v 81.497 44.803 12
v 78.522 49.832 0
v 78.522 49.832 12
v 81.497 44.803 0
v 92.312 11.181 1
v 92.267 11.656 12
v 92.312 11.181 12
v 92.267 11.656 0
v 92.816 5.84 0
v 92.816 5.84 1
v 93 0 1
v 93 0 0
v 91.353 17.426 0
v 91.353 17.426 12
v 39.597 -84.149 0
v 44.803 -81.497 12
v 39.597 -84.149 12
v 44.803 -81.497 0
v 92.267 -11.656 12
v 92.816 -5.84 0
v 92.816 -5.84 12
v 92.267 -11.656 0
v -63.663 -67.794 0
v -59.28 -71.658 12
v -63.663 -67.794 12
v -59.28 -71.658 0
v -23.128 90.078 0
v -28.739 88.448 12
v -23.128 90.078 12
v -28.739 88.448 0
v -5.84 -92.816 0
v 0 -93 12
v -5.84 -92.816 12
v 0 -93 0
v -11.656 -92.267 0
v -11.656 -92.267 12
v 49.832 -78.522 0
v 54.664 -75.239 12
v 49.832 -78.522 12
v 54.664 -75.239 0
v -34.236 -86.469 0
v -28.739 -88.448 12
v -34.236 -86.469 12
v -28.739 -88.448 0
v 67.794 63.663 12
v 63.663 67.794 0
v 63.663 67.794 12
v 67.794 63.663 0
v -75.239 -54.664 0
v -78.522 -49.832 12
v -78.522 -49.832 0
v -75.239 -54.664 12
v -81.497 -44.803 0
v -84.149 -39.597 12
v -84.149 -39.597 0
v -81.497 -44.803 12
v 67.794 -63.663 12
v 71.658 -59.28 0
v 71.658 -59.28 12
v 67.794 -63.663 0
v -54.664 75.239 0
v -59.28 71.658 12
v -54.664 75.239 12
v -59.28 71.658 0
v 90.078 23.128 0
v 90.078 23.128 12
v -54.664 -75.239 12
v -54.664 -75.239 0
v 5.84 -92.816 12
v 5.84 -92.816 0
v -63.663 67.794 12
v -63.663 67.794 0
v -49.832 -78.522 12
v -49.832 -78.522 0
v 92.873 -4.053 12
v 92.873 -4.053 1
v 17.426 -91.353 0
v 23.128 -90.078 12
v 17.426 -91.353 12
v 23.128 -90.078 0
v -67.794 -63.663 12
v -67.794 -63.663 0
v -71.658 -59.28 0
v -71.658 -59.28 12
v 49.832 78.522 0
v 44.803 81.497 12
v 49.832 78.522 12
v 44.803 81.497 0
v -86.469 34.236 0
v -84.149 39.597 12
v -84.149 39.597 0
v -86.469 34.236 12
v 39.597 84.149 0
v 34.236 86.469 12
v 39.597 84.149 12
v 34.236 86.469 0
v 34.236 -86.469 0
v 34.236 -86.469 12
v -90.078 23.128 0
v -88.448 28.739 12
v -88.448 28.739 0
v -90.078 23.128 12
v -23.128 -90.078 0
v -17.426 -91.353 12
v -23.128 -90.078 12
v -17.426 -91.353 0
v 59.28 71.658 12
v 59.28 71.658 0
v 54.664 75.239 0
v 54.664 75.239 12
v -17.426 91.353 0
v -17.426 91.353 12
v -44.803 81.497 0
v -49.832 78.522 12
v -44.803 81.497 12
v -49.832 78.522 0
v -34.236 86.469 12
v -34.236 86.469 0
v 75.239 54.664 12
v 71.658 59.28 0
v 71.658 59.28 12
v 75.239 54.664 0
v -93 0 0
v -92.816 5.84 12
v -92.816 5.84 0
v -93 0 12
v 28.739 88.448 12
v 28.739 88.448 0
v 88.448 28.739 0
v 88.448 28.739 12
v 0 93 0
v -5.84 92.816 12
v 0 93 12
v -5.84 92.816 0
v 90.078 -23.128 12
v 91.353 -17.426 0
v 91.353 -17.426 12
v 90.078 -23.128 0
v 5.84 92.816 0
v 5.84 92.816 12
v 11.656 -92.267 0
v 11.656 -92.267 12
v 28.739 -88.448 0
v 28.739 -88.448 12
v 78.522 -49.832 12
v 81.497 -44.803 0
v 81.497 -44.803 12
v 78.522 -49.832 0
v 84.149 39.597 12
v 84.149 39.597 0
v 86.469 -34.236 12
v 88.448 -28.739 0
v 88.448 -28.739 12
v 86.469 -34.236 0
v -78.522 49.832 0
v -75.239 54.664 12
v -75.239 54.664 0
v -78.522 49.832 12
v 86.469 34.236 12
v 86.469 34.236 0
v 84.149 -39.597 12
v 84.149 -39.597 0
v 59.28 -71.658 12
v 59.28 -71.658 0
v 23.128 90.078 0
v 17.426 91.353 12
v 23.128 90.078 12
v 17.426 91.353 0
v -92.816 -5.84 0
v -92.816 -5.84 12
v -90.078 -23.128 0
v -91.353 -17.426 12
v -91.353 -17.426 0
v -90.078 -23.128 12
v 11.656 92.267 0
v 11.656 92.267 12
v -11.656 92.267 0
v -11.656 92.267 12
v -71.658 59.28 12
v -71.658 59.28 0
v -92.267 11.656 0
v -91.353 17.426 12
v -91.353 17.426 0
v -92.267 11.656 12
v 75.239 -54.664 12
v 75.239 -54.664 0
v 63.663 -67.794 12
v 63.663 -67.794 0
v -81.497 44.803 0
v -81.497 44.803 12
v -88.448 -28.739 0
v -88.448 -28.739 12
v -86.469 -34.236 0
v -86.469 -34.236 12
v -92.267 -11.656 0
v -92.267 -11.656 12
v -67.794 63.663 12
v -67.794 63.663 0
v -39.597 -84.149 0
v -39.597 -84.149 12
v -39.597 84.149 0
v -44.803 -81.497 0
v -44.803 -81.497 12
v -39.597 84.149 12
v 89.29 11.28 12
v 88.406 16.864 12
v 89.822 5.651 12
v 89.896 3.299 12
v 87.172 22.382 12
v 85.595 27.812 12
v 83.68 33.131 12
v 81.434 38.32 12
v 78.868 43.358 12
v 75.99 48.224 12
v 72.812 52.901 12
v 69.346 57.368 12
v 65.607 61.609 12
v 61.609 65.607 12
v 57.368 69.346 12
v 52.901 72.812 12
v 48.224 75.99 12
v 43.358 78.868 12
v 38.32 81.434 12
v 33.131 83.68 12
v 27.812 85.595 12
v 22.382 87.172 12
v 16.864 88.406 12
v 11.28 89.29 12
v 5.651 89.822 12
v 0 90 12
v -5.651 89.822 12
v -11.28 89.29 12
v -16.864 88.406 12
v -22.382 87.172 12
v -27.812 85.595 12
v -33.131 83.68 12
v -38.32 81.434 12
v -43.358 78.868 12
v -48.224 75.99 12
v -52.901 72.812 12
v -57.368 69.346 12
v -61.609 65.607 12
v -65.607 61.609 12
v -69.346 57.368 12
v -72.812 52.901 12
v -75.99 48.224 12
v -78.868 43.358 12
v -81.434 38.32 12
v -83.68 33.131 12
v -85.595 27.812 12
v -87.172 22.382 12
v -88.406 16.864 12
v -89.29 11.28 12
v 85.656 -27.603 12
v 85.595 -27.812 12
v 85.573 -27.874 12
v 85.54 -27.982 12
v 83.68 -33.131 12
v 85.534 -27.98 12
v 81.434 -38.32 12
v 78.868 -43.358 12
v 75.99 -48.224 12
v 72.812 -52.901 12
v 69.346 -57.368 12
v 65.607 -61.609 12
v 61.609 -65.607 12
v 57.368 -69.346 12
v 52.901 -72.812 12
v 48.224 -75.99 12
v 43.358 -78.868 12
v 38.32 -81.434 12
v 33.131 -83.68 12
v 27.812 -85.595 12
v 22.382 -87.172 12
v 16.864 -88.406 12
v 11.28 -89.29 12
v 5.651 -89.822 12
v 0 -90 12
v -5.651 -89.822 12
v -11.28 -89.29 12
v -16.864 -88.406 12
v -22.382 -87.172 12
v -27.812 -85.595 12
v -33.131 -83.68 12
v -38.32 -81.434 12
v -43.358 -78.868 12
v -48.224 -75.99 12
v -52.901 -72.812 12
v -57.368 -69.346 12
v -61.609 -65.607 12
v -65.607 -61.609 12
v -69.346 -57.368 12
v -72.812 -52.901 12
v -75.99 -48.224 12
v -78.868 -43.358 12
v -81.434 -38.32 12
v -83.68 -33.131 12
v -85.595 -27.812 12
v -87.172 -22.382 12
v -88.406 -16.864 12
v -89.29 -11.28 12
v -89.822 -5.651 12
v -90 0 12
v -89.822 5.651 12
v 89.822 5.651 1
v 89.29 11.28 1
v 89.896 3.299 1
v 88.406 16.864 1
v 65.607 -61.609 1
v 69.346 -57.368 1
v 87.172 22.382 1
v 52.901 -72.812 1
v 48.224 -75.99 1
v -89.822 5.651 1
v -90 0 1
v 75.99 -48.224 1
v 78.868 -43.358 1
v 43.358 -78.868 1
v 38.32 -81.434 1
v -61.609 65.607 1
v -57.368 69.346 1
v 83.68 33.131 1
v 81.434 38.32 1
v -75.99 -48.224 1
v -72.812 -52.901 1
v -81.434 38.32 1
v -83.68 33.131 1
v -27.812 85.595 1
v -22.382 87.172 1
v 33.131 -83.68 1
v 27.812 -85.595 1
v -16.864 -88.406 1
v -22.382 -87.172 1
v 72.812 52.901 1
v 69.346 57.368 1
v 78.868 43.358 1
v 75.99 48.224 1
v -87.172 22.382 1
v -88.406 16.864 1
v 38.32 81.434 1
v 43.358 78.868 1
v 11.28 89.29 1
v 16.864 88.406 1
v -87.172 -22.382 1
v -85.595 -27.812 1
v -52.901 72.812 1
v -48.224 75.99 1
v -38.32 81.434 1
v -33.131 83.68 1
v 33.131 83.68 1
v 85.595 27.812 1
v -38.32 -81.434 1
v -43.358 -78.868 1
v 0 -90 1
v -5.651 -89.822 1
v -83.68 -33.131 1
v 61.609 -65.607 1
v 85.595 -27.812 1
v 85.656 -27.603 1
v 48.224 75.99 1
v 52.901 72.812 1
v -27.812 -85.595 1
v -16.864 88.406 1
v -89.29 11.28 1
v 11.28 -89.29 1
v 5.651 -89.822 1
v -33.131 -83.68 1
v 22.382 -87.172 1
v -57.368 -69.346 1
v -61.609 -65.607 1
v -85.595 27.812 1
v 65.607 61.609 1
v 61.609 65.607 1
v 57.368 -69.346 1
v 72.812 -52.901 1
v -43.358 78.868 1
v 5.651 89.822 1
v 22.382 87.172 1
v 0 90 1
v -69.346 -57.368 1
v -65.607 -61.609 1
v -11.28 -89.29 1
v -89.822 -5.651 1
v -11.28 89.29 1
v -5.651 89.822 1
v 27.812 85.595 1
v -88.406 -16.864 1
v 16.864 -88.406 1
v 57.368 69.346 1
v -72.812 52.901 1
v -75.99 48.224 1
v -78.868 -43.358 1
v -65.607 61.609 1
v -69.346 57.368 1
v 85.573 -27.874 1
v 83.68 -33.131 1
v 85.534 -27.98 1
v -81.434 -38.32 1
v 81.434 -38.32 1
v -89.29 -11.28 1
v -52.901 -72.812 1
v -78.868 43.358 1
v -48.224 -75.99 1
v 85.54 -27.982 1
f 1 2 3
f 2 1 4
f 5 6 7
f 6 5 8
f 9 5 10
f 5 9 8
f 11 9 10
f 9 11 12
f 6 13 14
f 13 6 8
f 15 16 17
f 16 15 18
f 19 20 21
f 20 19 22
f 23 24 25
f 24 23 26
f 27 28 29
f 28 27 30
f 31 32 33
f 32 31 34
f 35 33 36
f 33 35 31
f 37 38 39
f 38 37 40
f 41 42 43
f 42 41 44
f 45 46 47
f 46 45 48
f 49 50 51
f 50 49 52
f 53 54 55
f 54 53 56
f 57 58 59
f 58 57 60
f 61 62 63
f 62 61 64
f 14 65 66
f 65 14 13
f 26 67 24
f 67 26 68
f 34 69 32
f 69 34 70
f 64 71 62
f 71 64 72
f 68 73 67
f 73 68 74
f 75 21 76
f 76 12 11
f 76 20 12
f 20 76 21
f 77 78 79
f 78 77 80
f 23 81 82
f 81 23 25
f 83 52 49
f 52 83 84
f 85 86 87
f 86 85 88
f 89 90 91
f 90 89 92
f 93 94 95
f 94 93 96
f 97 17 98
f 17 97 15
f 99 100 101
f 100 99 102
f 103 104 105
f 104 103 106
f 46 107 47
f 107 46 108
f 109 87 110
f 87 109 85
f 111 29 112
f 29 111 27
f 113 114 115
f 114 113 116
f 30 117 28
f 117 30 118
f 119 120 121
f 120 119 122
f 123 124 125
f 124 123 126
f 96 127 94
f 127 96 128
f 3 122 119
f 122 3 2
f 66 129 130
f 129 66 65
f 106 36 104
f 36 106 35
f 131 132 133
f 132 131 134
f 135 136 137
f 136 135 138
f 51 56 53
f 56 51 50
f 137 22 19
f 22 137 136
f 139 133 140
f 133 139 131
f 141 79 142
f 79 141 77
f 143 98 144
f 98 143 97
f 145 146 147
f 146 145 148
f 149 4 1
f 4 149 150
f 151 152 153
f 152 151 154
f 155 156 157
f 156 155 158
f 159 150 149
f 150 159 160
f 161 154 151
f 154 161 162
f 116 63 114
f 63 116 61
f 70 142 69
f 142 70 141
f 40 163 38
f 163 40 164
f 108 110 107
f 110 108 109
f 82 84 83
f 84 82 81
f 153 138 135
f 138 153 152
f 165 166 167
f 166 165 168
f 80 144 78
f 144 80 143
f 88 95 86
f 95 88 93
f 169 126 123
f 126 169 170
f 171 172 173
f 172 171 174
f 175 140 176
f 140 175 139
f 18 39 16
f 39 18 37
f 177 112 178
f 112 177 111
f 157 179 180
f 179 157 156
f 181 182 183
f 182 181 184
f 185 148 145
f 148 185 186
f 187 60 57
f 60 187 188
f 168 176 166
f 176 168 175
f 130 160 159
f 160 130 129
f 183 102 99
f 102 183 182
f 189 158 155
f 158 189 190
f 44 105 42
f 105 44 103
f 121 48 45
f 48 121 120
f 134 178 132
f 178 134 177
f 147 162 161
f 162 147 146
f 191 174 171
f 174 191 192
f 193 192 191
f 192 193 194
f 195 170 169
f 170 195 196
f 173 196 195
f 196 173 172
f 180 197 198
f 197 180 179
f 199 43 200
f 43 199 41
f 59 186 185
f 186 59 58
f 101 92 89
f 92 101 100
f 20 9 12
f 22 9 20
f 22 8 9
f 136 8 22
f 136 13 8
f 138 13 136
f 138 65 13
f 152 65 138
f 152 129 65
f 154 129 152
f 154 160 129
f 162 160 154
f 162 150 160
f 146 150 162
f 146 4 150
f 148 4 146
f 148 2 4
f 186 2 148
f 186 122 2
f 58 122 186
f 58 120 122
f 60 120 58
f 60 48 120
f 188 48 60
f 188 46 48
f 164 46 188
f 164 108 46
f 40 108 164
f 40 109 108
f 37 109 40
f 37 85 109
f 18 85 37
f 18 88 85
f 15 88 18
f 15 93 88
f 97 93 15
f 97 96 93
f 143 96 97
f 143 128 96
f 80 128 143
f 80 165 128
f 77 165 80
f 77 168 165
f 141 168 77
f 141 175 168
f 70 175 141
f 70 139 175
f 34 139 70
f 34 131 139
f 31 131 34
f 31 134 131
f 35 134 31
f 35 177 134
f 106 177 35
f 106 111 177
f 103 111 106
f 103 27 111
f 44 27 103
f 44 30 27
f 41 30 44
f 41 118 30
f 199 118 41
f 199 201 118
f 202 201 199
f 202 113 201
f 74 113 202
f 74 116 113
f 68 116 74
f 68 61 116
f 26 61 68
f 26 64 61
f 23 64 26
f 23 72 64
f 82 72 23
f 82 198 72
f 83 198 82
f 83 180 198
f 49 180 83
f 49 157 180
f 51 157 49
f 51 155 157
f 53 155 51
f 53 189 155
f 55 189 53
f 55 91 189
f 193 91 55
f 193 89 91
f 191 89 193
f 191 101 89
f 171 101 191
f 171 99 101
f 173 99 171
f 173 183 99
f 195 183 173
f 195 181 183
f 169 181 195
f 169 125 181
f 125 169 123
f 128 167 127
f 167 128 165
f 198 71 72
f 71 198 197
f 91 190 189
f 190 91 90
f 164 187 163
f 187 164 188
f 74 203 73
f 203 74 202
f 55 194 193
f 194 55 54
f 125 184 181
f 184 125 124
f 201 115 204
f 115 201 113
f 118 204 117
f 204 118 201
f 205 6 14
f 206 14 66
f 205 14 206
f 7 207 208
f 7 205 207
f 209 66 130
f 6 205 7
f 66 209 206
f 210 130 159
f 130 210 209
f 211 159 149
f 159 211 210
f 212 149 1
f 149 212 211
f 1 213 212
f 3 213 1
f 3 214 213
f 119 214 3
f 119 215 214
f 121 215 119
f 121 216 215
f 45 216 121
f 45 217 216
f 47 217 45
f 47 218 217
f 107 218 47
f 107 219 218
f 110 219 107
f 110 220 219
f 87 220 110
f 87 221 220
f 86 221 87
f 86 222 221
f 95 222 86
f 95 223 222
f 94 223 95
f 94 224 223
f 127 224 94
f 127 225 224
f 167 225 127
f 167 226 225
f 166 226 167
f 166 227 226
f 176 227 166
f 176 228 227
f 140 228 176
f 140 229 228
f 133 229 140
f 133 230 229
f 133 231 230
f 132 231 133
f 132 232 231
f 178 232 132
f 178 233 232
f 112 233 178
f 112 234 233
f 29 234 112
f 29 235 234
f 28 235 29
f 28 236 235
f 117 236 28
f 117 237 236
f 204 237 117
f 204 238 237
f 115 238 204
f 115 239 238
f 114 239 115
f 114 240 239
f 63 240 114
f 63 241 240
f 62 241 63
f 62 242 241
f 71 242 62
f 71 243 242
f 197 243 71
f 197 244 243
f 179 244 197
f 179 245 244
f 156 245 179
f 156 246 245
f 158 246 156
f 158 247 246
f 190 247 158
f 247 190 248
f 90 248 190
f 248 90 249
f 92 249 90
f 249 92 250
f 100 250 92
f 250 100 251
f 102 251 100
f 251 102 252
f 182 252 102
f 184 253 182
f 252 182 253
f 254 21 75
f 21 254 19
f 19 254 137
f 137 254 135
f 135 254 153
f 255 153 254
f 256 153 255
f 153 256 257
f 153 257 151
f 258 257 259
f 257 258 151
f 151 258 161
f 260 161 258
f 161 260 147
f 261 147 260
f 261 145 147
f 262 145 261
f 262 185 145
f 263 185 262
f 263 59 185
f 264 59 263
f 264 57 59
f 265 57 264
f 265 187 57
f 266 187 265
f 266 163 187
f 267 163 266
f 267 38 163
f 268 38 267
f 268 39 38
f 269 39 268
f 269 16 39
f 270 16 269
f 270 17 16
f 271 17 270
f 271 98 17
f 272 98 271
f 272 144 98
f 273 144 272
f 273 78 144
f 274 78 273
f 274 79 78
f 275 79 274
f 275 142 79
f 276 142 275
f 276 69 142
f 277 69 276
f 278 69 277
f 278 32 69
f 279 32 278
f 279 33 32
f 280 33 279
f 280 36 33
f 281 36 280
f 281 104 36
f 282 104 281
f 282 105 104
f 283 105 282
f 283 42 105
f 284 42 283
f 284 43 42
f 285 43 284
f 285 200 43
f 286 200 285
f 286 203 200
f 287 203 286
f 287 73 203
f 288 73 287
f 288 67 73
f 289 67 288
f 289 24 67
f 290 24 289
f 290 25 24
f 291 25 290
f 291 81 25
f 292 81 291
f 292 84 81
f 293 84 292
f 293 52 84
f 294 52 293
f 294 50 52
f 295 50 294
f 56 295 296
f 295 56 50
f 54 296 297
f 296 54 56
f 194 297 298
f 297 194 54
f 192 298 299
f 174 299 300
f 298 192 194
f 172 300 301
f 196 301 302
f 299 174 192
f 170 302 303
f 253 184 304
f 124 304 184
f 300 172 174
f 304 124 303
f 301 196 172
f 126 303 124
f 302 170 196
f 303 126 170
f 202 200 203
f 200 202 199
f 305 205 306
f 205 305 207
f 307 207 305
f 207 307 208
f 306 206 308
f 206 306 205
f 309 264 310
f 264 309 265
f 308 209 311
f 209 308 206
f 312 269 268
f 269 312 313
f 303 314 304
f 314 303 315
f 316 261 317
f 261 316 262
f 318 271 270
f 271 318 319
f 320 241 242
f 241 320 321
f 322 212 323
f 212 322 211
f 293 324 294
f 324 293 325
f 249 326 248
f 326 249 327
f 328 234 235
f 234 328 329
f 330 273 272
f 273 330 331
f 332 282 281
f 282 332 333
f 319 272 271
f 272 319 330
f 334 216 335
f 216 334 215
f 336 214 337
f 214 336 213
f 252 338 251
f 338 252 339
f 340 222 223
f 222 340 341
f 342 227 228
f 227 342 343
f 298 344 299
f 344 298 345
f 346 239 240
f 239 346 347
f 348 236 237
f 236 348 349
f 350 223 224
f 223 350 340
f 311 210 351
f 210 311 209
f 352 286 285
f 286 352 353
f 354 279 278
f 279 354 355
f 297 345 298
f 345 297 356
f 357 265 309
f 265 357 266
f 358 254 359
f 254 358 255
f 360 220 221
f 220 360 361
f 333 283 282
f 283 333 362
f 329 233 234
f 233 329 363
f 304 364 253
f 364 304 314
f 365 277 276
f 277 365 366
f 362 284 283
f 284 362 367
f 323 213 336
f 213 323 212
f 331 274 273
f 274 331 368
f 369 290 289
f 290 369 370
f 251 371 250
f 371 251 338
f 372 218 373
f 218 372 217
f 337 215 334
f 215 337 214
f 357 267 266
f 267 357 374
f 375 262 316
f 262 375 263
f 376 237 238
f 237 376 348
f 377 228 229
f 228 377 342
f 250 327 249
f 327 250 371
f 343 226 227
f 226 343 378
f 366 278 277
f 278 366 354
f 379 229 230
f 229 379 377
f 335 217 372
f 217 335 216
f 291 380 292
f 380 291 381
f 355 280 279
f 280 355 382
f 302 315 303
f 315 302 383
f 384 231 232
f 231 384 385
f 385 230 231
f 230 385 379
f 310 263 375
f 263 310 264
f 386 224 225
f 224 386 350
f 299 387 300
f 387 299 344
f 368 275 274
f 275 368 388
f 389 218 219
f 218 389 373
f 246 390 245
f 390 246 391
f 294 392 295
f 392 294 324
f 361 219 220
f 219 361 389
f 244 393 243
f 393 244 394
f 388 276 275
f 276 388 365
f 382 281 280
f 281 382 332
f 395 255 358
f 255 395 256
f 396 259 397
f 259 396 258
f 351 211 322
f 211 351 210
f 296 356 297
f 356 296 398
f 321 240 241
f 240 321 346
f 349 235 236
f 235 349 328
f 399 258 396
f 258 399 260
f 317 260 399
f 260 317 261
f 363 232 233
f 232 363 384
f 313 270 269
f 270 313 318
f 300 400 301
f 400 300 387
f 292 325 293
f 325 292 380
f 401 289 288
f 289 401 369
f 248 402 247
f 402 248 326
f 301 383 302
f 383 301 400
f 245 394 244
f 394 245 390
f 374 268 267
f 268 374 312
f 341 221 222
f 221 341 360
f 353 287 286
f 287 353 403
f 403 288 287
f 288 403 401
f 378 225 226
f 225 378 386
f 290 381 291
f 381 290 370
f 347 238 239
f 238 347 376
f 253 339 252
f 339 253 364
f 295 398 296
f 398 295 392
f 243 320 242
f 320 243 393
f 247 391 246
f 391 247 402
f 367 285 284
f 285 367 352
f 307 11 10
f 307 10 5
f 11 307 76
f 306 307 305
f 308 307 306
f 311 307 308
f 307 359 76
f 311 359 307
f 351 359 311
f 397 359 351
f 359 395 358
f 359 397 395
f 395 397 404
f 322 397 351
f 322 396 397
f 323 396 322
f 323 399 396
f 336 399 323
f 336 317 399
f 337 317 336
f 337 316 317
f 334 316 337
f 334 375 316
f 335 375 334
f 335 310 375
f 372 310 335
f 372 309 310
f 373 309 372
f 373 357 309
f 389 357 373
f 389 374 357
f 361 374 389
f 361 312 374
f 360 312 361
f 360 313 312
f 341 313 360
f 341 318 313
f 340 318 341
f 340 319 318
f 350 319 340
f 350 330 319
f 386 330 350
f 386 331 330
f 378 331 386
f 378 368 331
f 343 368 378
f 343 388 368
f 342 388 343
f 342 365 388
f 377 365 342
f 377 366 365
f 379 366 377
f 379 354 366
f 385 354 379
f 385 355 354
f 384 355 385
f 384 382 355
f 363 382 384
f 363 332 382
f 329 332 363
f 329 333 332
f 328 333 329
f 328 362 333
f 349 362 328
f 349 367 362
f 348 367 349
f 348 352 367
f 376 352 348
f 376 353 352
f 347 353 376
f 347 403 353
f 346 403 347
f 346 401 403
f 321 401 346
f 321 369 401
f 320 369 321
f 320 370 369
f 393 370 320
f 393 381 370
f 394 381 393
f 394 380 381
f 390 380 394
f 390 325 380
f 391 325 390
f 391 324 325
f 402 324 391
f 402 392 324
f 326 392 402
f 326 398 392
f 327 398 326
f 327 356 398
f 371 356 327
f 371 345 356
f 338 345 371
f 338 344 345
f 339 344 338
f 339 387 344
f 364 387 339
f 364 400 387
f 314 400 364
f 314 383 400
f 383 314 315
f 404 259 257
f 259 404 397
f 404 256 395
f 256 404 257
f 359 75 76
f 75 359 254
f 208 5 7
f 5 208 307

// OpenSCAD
bottom_h = 1;
d = 180;
wall_t = 3;
wall_h = 11;

hole_t = 5;

M = 19;

function p_compute( c, l, t, theta ) = [
    c[ 0 ] + 0.5 * ( l * cos( theta ) + t * sin( theta ) ),
    c[ 1 ] + 0.5 * ( l * sin( theta ) - t * cos( theta ) )
];

function d_compute( c, l, t, r, theta ) = 
    let( v = p_compute( c, l, t, theta ) )
        v[ 0 ] * v[ 0 ] + v[ 1 ] * v[ 1 ] - r * r;
        
function theta_compute( c, l, t, r, theta_0, theta_1 ) =
    abs( theta_0 - theta_1 ) <= 1e-6 ? theta_1 :
        let(
             f_0 = d_compute( c, l, t, r, theta_0 ),
             f_1 = d_compute( c, l, t, r, theta_1 )
           )
            theta_compute( c, l, t, r, theta_1, theta_1 - f_1 * ( theta_1 - theta_0 ) / ( f_1 - f_0 ) );
            
l = M * wall_t;
c = [ d / 2 + wall_t / 2, 0 ];
t = hole_t;
r = d / 2;

theta = theta_compute( c, l, t, r, 90, 89 );
echo( theta );

difference(){
    cylinder( d = d + 2 * wall_t, h = bottom_h + wall_h, $fn = 100 );
    translate( [ 0, 0, bottom_h ] )
        cylinder( d = d, h = bottom_h + wall_h, $fn = 100 );
    

    translate( [ c[ 0 ], 0, 0 ] )
        rotate( -theta, [ 0, 0, 1 ] )
            translate( [ -l / 2, -hole_t / 2, bottom_h ] )
                cube( [ l, hole_t, wall_h + 1 ] );
}
